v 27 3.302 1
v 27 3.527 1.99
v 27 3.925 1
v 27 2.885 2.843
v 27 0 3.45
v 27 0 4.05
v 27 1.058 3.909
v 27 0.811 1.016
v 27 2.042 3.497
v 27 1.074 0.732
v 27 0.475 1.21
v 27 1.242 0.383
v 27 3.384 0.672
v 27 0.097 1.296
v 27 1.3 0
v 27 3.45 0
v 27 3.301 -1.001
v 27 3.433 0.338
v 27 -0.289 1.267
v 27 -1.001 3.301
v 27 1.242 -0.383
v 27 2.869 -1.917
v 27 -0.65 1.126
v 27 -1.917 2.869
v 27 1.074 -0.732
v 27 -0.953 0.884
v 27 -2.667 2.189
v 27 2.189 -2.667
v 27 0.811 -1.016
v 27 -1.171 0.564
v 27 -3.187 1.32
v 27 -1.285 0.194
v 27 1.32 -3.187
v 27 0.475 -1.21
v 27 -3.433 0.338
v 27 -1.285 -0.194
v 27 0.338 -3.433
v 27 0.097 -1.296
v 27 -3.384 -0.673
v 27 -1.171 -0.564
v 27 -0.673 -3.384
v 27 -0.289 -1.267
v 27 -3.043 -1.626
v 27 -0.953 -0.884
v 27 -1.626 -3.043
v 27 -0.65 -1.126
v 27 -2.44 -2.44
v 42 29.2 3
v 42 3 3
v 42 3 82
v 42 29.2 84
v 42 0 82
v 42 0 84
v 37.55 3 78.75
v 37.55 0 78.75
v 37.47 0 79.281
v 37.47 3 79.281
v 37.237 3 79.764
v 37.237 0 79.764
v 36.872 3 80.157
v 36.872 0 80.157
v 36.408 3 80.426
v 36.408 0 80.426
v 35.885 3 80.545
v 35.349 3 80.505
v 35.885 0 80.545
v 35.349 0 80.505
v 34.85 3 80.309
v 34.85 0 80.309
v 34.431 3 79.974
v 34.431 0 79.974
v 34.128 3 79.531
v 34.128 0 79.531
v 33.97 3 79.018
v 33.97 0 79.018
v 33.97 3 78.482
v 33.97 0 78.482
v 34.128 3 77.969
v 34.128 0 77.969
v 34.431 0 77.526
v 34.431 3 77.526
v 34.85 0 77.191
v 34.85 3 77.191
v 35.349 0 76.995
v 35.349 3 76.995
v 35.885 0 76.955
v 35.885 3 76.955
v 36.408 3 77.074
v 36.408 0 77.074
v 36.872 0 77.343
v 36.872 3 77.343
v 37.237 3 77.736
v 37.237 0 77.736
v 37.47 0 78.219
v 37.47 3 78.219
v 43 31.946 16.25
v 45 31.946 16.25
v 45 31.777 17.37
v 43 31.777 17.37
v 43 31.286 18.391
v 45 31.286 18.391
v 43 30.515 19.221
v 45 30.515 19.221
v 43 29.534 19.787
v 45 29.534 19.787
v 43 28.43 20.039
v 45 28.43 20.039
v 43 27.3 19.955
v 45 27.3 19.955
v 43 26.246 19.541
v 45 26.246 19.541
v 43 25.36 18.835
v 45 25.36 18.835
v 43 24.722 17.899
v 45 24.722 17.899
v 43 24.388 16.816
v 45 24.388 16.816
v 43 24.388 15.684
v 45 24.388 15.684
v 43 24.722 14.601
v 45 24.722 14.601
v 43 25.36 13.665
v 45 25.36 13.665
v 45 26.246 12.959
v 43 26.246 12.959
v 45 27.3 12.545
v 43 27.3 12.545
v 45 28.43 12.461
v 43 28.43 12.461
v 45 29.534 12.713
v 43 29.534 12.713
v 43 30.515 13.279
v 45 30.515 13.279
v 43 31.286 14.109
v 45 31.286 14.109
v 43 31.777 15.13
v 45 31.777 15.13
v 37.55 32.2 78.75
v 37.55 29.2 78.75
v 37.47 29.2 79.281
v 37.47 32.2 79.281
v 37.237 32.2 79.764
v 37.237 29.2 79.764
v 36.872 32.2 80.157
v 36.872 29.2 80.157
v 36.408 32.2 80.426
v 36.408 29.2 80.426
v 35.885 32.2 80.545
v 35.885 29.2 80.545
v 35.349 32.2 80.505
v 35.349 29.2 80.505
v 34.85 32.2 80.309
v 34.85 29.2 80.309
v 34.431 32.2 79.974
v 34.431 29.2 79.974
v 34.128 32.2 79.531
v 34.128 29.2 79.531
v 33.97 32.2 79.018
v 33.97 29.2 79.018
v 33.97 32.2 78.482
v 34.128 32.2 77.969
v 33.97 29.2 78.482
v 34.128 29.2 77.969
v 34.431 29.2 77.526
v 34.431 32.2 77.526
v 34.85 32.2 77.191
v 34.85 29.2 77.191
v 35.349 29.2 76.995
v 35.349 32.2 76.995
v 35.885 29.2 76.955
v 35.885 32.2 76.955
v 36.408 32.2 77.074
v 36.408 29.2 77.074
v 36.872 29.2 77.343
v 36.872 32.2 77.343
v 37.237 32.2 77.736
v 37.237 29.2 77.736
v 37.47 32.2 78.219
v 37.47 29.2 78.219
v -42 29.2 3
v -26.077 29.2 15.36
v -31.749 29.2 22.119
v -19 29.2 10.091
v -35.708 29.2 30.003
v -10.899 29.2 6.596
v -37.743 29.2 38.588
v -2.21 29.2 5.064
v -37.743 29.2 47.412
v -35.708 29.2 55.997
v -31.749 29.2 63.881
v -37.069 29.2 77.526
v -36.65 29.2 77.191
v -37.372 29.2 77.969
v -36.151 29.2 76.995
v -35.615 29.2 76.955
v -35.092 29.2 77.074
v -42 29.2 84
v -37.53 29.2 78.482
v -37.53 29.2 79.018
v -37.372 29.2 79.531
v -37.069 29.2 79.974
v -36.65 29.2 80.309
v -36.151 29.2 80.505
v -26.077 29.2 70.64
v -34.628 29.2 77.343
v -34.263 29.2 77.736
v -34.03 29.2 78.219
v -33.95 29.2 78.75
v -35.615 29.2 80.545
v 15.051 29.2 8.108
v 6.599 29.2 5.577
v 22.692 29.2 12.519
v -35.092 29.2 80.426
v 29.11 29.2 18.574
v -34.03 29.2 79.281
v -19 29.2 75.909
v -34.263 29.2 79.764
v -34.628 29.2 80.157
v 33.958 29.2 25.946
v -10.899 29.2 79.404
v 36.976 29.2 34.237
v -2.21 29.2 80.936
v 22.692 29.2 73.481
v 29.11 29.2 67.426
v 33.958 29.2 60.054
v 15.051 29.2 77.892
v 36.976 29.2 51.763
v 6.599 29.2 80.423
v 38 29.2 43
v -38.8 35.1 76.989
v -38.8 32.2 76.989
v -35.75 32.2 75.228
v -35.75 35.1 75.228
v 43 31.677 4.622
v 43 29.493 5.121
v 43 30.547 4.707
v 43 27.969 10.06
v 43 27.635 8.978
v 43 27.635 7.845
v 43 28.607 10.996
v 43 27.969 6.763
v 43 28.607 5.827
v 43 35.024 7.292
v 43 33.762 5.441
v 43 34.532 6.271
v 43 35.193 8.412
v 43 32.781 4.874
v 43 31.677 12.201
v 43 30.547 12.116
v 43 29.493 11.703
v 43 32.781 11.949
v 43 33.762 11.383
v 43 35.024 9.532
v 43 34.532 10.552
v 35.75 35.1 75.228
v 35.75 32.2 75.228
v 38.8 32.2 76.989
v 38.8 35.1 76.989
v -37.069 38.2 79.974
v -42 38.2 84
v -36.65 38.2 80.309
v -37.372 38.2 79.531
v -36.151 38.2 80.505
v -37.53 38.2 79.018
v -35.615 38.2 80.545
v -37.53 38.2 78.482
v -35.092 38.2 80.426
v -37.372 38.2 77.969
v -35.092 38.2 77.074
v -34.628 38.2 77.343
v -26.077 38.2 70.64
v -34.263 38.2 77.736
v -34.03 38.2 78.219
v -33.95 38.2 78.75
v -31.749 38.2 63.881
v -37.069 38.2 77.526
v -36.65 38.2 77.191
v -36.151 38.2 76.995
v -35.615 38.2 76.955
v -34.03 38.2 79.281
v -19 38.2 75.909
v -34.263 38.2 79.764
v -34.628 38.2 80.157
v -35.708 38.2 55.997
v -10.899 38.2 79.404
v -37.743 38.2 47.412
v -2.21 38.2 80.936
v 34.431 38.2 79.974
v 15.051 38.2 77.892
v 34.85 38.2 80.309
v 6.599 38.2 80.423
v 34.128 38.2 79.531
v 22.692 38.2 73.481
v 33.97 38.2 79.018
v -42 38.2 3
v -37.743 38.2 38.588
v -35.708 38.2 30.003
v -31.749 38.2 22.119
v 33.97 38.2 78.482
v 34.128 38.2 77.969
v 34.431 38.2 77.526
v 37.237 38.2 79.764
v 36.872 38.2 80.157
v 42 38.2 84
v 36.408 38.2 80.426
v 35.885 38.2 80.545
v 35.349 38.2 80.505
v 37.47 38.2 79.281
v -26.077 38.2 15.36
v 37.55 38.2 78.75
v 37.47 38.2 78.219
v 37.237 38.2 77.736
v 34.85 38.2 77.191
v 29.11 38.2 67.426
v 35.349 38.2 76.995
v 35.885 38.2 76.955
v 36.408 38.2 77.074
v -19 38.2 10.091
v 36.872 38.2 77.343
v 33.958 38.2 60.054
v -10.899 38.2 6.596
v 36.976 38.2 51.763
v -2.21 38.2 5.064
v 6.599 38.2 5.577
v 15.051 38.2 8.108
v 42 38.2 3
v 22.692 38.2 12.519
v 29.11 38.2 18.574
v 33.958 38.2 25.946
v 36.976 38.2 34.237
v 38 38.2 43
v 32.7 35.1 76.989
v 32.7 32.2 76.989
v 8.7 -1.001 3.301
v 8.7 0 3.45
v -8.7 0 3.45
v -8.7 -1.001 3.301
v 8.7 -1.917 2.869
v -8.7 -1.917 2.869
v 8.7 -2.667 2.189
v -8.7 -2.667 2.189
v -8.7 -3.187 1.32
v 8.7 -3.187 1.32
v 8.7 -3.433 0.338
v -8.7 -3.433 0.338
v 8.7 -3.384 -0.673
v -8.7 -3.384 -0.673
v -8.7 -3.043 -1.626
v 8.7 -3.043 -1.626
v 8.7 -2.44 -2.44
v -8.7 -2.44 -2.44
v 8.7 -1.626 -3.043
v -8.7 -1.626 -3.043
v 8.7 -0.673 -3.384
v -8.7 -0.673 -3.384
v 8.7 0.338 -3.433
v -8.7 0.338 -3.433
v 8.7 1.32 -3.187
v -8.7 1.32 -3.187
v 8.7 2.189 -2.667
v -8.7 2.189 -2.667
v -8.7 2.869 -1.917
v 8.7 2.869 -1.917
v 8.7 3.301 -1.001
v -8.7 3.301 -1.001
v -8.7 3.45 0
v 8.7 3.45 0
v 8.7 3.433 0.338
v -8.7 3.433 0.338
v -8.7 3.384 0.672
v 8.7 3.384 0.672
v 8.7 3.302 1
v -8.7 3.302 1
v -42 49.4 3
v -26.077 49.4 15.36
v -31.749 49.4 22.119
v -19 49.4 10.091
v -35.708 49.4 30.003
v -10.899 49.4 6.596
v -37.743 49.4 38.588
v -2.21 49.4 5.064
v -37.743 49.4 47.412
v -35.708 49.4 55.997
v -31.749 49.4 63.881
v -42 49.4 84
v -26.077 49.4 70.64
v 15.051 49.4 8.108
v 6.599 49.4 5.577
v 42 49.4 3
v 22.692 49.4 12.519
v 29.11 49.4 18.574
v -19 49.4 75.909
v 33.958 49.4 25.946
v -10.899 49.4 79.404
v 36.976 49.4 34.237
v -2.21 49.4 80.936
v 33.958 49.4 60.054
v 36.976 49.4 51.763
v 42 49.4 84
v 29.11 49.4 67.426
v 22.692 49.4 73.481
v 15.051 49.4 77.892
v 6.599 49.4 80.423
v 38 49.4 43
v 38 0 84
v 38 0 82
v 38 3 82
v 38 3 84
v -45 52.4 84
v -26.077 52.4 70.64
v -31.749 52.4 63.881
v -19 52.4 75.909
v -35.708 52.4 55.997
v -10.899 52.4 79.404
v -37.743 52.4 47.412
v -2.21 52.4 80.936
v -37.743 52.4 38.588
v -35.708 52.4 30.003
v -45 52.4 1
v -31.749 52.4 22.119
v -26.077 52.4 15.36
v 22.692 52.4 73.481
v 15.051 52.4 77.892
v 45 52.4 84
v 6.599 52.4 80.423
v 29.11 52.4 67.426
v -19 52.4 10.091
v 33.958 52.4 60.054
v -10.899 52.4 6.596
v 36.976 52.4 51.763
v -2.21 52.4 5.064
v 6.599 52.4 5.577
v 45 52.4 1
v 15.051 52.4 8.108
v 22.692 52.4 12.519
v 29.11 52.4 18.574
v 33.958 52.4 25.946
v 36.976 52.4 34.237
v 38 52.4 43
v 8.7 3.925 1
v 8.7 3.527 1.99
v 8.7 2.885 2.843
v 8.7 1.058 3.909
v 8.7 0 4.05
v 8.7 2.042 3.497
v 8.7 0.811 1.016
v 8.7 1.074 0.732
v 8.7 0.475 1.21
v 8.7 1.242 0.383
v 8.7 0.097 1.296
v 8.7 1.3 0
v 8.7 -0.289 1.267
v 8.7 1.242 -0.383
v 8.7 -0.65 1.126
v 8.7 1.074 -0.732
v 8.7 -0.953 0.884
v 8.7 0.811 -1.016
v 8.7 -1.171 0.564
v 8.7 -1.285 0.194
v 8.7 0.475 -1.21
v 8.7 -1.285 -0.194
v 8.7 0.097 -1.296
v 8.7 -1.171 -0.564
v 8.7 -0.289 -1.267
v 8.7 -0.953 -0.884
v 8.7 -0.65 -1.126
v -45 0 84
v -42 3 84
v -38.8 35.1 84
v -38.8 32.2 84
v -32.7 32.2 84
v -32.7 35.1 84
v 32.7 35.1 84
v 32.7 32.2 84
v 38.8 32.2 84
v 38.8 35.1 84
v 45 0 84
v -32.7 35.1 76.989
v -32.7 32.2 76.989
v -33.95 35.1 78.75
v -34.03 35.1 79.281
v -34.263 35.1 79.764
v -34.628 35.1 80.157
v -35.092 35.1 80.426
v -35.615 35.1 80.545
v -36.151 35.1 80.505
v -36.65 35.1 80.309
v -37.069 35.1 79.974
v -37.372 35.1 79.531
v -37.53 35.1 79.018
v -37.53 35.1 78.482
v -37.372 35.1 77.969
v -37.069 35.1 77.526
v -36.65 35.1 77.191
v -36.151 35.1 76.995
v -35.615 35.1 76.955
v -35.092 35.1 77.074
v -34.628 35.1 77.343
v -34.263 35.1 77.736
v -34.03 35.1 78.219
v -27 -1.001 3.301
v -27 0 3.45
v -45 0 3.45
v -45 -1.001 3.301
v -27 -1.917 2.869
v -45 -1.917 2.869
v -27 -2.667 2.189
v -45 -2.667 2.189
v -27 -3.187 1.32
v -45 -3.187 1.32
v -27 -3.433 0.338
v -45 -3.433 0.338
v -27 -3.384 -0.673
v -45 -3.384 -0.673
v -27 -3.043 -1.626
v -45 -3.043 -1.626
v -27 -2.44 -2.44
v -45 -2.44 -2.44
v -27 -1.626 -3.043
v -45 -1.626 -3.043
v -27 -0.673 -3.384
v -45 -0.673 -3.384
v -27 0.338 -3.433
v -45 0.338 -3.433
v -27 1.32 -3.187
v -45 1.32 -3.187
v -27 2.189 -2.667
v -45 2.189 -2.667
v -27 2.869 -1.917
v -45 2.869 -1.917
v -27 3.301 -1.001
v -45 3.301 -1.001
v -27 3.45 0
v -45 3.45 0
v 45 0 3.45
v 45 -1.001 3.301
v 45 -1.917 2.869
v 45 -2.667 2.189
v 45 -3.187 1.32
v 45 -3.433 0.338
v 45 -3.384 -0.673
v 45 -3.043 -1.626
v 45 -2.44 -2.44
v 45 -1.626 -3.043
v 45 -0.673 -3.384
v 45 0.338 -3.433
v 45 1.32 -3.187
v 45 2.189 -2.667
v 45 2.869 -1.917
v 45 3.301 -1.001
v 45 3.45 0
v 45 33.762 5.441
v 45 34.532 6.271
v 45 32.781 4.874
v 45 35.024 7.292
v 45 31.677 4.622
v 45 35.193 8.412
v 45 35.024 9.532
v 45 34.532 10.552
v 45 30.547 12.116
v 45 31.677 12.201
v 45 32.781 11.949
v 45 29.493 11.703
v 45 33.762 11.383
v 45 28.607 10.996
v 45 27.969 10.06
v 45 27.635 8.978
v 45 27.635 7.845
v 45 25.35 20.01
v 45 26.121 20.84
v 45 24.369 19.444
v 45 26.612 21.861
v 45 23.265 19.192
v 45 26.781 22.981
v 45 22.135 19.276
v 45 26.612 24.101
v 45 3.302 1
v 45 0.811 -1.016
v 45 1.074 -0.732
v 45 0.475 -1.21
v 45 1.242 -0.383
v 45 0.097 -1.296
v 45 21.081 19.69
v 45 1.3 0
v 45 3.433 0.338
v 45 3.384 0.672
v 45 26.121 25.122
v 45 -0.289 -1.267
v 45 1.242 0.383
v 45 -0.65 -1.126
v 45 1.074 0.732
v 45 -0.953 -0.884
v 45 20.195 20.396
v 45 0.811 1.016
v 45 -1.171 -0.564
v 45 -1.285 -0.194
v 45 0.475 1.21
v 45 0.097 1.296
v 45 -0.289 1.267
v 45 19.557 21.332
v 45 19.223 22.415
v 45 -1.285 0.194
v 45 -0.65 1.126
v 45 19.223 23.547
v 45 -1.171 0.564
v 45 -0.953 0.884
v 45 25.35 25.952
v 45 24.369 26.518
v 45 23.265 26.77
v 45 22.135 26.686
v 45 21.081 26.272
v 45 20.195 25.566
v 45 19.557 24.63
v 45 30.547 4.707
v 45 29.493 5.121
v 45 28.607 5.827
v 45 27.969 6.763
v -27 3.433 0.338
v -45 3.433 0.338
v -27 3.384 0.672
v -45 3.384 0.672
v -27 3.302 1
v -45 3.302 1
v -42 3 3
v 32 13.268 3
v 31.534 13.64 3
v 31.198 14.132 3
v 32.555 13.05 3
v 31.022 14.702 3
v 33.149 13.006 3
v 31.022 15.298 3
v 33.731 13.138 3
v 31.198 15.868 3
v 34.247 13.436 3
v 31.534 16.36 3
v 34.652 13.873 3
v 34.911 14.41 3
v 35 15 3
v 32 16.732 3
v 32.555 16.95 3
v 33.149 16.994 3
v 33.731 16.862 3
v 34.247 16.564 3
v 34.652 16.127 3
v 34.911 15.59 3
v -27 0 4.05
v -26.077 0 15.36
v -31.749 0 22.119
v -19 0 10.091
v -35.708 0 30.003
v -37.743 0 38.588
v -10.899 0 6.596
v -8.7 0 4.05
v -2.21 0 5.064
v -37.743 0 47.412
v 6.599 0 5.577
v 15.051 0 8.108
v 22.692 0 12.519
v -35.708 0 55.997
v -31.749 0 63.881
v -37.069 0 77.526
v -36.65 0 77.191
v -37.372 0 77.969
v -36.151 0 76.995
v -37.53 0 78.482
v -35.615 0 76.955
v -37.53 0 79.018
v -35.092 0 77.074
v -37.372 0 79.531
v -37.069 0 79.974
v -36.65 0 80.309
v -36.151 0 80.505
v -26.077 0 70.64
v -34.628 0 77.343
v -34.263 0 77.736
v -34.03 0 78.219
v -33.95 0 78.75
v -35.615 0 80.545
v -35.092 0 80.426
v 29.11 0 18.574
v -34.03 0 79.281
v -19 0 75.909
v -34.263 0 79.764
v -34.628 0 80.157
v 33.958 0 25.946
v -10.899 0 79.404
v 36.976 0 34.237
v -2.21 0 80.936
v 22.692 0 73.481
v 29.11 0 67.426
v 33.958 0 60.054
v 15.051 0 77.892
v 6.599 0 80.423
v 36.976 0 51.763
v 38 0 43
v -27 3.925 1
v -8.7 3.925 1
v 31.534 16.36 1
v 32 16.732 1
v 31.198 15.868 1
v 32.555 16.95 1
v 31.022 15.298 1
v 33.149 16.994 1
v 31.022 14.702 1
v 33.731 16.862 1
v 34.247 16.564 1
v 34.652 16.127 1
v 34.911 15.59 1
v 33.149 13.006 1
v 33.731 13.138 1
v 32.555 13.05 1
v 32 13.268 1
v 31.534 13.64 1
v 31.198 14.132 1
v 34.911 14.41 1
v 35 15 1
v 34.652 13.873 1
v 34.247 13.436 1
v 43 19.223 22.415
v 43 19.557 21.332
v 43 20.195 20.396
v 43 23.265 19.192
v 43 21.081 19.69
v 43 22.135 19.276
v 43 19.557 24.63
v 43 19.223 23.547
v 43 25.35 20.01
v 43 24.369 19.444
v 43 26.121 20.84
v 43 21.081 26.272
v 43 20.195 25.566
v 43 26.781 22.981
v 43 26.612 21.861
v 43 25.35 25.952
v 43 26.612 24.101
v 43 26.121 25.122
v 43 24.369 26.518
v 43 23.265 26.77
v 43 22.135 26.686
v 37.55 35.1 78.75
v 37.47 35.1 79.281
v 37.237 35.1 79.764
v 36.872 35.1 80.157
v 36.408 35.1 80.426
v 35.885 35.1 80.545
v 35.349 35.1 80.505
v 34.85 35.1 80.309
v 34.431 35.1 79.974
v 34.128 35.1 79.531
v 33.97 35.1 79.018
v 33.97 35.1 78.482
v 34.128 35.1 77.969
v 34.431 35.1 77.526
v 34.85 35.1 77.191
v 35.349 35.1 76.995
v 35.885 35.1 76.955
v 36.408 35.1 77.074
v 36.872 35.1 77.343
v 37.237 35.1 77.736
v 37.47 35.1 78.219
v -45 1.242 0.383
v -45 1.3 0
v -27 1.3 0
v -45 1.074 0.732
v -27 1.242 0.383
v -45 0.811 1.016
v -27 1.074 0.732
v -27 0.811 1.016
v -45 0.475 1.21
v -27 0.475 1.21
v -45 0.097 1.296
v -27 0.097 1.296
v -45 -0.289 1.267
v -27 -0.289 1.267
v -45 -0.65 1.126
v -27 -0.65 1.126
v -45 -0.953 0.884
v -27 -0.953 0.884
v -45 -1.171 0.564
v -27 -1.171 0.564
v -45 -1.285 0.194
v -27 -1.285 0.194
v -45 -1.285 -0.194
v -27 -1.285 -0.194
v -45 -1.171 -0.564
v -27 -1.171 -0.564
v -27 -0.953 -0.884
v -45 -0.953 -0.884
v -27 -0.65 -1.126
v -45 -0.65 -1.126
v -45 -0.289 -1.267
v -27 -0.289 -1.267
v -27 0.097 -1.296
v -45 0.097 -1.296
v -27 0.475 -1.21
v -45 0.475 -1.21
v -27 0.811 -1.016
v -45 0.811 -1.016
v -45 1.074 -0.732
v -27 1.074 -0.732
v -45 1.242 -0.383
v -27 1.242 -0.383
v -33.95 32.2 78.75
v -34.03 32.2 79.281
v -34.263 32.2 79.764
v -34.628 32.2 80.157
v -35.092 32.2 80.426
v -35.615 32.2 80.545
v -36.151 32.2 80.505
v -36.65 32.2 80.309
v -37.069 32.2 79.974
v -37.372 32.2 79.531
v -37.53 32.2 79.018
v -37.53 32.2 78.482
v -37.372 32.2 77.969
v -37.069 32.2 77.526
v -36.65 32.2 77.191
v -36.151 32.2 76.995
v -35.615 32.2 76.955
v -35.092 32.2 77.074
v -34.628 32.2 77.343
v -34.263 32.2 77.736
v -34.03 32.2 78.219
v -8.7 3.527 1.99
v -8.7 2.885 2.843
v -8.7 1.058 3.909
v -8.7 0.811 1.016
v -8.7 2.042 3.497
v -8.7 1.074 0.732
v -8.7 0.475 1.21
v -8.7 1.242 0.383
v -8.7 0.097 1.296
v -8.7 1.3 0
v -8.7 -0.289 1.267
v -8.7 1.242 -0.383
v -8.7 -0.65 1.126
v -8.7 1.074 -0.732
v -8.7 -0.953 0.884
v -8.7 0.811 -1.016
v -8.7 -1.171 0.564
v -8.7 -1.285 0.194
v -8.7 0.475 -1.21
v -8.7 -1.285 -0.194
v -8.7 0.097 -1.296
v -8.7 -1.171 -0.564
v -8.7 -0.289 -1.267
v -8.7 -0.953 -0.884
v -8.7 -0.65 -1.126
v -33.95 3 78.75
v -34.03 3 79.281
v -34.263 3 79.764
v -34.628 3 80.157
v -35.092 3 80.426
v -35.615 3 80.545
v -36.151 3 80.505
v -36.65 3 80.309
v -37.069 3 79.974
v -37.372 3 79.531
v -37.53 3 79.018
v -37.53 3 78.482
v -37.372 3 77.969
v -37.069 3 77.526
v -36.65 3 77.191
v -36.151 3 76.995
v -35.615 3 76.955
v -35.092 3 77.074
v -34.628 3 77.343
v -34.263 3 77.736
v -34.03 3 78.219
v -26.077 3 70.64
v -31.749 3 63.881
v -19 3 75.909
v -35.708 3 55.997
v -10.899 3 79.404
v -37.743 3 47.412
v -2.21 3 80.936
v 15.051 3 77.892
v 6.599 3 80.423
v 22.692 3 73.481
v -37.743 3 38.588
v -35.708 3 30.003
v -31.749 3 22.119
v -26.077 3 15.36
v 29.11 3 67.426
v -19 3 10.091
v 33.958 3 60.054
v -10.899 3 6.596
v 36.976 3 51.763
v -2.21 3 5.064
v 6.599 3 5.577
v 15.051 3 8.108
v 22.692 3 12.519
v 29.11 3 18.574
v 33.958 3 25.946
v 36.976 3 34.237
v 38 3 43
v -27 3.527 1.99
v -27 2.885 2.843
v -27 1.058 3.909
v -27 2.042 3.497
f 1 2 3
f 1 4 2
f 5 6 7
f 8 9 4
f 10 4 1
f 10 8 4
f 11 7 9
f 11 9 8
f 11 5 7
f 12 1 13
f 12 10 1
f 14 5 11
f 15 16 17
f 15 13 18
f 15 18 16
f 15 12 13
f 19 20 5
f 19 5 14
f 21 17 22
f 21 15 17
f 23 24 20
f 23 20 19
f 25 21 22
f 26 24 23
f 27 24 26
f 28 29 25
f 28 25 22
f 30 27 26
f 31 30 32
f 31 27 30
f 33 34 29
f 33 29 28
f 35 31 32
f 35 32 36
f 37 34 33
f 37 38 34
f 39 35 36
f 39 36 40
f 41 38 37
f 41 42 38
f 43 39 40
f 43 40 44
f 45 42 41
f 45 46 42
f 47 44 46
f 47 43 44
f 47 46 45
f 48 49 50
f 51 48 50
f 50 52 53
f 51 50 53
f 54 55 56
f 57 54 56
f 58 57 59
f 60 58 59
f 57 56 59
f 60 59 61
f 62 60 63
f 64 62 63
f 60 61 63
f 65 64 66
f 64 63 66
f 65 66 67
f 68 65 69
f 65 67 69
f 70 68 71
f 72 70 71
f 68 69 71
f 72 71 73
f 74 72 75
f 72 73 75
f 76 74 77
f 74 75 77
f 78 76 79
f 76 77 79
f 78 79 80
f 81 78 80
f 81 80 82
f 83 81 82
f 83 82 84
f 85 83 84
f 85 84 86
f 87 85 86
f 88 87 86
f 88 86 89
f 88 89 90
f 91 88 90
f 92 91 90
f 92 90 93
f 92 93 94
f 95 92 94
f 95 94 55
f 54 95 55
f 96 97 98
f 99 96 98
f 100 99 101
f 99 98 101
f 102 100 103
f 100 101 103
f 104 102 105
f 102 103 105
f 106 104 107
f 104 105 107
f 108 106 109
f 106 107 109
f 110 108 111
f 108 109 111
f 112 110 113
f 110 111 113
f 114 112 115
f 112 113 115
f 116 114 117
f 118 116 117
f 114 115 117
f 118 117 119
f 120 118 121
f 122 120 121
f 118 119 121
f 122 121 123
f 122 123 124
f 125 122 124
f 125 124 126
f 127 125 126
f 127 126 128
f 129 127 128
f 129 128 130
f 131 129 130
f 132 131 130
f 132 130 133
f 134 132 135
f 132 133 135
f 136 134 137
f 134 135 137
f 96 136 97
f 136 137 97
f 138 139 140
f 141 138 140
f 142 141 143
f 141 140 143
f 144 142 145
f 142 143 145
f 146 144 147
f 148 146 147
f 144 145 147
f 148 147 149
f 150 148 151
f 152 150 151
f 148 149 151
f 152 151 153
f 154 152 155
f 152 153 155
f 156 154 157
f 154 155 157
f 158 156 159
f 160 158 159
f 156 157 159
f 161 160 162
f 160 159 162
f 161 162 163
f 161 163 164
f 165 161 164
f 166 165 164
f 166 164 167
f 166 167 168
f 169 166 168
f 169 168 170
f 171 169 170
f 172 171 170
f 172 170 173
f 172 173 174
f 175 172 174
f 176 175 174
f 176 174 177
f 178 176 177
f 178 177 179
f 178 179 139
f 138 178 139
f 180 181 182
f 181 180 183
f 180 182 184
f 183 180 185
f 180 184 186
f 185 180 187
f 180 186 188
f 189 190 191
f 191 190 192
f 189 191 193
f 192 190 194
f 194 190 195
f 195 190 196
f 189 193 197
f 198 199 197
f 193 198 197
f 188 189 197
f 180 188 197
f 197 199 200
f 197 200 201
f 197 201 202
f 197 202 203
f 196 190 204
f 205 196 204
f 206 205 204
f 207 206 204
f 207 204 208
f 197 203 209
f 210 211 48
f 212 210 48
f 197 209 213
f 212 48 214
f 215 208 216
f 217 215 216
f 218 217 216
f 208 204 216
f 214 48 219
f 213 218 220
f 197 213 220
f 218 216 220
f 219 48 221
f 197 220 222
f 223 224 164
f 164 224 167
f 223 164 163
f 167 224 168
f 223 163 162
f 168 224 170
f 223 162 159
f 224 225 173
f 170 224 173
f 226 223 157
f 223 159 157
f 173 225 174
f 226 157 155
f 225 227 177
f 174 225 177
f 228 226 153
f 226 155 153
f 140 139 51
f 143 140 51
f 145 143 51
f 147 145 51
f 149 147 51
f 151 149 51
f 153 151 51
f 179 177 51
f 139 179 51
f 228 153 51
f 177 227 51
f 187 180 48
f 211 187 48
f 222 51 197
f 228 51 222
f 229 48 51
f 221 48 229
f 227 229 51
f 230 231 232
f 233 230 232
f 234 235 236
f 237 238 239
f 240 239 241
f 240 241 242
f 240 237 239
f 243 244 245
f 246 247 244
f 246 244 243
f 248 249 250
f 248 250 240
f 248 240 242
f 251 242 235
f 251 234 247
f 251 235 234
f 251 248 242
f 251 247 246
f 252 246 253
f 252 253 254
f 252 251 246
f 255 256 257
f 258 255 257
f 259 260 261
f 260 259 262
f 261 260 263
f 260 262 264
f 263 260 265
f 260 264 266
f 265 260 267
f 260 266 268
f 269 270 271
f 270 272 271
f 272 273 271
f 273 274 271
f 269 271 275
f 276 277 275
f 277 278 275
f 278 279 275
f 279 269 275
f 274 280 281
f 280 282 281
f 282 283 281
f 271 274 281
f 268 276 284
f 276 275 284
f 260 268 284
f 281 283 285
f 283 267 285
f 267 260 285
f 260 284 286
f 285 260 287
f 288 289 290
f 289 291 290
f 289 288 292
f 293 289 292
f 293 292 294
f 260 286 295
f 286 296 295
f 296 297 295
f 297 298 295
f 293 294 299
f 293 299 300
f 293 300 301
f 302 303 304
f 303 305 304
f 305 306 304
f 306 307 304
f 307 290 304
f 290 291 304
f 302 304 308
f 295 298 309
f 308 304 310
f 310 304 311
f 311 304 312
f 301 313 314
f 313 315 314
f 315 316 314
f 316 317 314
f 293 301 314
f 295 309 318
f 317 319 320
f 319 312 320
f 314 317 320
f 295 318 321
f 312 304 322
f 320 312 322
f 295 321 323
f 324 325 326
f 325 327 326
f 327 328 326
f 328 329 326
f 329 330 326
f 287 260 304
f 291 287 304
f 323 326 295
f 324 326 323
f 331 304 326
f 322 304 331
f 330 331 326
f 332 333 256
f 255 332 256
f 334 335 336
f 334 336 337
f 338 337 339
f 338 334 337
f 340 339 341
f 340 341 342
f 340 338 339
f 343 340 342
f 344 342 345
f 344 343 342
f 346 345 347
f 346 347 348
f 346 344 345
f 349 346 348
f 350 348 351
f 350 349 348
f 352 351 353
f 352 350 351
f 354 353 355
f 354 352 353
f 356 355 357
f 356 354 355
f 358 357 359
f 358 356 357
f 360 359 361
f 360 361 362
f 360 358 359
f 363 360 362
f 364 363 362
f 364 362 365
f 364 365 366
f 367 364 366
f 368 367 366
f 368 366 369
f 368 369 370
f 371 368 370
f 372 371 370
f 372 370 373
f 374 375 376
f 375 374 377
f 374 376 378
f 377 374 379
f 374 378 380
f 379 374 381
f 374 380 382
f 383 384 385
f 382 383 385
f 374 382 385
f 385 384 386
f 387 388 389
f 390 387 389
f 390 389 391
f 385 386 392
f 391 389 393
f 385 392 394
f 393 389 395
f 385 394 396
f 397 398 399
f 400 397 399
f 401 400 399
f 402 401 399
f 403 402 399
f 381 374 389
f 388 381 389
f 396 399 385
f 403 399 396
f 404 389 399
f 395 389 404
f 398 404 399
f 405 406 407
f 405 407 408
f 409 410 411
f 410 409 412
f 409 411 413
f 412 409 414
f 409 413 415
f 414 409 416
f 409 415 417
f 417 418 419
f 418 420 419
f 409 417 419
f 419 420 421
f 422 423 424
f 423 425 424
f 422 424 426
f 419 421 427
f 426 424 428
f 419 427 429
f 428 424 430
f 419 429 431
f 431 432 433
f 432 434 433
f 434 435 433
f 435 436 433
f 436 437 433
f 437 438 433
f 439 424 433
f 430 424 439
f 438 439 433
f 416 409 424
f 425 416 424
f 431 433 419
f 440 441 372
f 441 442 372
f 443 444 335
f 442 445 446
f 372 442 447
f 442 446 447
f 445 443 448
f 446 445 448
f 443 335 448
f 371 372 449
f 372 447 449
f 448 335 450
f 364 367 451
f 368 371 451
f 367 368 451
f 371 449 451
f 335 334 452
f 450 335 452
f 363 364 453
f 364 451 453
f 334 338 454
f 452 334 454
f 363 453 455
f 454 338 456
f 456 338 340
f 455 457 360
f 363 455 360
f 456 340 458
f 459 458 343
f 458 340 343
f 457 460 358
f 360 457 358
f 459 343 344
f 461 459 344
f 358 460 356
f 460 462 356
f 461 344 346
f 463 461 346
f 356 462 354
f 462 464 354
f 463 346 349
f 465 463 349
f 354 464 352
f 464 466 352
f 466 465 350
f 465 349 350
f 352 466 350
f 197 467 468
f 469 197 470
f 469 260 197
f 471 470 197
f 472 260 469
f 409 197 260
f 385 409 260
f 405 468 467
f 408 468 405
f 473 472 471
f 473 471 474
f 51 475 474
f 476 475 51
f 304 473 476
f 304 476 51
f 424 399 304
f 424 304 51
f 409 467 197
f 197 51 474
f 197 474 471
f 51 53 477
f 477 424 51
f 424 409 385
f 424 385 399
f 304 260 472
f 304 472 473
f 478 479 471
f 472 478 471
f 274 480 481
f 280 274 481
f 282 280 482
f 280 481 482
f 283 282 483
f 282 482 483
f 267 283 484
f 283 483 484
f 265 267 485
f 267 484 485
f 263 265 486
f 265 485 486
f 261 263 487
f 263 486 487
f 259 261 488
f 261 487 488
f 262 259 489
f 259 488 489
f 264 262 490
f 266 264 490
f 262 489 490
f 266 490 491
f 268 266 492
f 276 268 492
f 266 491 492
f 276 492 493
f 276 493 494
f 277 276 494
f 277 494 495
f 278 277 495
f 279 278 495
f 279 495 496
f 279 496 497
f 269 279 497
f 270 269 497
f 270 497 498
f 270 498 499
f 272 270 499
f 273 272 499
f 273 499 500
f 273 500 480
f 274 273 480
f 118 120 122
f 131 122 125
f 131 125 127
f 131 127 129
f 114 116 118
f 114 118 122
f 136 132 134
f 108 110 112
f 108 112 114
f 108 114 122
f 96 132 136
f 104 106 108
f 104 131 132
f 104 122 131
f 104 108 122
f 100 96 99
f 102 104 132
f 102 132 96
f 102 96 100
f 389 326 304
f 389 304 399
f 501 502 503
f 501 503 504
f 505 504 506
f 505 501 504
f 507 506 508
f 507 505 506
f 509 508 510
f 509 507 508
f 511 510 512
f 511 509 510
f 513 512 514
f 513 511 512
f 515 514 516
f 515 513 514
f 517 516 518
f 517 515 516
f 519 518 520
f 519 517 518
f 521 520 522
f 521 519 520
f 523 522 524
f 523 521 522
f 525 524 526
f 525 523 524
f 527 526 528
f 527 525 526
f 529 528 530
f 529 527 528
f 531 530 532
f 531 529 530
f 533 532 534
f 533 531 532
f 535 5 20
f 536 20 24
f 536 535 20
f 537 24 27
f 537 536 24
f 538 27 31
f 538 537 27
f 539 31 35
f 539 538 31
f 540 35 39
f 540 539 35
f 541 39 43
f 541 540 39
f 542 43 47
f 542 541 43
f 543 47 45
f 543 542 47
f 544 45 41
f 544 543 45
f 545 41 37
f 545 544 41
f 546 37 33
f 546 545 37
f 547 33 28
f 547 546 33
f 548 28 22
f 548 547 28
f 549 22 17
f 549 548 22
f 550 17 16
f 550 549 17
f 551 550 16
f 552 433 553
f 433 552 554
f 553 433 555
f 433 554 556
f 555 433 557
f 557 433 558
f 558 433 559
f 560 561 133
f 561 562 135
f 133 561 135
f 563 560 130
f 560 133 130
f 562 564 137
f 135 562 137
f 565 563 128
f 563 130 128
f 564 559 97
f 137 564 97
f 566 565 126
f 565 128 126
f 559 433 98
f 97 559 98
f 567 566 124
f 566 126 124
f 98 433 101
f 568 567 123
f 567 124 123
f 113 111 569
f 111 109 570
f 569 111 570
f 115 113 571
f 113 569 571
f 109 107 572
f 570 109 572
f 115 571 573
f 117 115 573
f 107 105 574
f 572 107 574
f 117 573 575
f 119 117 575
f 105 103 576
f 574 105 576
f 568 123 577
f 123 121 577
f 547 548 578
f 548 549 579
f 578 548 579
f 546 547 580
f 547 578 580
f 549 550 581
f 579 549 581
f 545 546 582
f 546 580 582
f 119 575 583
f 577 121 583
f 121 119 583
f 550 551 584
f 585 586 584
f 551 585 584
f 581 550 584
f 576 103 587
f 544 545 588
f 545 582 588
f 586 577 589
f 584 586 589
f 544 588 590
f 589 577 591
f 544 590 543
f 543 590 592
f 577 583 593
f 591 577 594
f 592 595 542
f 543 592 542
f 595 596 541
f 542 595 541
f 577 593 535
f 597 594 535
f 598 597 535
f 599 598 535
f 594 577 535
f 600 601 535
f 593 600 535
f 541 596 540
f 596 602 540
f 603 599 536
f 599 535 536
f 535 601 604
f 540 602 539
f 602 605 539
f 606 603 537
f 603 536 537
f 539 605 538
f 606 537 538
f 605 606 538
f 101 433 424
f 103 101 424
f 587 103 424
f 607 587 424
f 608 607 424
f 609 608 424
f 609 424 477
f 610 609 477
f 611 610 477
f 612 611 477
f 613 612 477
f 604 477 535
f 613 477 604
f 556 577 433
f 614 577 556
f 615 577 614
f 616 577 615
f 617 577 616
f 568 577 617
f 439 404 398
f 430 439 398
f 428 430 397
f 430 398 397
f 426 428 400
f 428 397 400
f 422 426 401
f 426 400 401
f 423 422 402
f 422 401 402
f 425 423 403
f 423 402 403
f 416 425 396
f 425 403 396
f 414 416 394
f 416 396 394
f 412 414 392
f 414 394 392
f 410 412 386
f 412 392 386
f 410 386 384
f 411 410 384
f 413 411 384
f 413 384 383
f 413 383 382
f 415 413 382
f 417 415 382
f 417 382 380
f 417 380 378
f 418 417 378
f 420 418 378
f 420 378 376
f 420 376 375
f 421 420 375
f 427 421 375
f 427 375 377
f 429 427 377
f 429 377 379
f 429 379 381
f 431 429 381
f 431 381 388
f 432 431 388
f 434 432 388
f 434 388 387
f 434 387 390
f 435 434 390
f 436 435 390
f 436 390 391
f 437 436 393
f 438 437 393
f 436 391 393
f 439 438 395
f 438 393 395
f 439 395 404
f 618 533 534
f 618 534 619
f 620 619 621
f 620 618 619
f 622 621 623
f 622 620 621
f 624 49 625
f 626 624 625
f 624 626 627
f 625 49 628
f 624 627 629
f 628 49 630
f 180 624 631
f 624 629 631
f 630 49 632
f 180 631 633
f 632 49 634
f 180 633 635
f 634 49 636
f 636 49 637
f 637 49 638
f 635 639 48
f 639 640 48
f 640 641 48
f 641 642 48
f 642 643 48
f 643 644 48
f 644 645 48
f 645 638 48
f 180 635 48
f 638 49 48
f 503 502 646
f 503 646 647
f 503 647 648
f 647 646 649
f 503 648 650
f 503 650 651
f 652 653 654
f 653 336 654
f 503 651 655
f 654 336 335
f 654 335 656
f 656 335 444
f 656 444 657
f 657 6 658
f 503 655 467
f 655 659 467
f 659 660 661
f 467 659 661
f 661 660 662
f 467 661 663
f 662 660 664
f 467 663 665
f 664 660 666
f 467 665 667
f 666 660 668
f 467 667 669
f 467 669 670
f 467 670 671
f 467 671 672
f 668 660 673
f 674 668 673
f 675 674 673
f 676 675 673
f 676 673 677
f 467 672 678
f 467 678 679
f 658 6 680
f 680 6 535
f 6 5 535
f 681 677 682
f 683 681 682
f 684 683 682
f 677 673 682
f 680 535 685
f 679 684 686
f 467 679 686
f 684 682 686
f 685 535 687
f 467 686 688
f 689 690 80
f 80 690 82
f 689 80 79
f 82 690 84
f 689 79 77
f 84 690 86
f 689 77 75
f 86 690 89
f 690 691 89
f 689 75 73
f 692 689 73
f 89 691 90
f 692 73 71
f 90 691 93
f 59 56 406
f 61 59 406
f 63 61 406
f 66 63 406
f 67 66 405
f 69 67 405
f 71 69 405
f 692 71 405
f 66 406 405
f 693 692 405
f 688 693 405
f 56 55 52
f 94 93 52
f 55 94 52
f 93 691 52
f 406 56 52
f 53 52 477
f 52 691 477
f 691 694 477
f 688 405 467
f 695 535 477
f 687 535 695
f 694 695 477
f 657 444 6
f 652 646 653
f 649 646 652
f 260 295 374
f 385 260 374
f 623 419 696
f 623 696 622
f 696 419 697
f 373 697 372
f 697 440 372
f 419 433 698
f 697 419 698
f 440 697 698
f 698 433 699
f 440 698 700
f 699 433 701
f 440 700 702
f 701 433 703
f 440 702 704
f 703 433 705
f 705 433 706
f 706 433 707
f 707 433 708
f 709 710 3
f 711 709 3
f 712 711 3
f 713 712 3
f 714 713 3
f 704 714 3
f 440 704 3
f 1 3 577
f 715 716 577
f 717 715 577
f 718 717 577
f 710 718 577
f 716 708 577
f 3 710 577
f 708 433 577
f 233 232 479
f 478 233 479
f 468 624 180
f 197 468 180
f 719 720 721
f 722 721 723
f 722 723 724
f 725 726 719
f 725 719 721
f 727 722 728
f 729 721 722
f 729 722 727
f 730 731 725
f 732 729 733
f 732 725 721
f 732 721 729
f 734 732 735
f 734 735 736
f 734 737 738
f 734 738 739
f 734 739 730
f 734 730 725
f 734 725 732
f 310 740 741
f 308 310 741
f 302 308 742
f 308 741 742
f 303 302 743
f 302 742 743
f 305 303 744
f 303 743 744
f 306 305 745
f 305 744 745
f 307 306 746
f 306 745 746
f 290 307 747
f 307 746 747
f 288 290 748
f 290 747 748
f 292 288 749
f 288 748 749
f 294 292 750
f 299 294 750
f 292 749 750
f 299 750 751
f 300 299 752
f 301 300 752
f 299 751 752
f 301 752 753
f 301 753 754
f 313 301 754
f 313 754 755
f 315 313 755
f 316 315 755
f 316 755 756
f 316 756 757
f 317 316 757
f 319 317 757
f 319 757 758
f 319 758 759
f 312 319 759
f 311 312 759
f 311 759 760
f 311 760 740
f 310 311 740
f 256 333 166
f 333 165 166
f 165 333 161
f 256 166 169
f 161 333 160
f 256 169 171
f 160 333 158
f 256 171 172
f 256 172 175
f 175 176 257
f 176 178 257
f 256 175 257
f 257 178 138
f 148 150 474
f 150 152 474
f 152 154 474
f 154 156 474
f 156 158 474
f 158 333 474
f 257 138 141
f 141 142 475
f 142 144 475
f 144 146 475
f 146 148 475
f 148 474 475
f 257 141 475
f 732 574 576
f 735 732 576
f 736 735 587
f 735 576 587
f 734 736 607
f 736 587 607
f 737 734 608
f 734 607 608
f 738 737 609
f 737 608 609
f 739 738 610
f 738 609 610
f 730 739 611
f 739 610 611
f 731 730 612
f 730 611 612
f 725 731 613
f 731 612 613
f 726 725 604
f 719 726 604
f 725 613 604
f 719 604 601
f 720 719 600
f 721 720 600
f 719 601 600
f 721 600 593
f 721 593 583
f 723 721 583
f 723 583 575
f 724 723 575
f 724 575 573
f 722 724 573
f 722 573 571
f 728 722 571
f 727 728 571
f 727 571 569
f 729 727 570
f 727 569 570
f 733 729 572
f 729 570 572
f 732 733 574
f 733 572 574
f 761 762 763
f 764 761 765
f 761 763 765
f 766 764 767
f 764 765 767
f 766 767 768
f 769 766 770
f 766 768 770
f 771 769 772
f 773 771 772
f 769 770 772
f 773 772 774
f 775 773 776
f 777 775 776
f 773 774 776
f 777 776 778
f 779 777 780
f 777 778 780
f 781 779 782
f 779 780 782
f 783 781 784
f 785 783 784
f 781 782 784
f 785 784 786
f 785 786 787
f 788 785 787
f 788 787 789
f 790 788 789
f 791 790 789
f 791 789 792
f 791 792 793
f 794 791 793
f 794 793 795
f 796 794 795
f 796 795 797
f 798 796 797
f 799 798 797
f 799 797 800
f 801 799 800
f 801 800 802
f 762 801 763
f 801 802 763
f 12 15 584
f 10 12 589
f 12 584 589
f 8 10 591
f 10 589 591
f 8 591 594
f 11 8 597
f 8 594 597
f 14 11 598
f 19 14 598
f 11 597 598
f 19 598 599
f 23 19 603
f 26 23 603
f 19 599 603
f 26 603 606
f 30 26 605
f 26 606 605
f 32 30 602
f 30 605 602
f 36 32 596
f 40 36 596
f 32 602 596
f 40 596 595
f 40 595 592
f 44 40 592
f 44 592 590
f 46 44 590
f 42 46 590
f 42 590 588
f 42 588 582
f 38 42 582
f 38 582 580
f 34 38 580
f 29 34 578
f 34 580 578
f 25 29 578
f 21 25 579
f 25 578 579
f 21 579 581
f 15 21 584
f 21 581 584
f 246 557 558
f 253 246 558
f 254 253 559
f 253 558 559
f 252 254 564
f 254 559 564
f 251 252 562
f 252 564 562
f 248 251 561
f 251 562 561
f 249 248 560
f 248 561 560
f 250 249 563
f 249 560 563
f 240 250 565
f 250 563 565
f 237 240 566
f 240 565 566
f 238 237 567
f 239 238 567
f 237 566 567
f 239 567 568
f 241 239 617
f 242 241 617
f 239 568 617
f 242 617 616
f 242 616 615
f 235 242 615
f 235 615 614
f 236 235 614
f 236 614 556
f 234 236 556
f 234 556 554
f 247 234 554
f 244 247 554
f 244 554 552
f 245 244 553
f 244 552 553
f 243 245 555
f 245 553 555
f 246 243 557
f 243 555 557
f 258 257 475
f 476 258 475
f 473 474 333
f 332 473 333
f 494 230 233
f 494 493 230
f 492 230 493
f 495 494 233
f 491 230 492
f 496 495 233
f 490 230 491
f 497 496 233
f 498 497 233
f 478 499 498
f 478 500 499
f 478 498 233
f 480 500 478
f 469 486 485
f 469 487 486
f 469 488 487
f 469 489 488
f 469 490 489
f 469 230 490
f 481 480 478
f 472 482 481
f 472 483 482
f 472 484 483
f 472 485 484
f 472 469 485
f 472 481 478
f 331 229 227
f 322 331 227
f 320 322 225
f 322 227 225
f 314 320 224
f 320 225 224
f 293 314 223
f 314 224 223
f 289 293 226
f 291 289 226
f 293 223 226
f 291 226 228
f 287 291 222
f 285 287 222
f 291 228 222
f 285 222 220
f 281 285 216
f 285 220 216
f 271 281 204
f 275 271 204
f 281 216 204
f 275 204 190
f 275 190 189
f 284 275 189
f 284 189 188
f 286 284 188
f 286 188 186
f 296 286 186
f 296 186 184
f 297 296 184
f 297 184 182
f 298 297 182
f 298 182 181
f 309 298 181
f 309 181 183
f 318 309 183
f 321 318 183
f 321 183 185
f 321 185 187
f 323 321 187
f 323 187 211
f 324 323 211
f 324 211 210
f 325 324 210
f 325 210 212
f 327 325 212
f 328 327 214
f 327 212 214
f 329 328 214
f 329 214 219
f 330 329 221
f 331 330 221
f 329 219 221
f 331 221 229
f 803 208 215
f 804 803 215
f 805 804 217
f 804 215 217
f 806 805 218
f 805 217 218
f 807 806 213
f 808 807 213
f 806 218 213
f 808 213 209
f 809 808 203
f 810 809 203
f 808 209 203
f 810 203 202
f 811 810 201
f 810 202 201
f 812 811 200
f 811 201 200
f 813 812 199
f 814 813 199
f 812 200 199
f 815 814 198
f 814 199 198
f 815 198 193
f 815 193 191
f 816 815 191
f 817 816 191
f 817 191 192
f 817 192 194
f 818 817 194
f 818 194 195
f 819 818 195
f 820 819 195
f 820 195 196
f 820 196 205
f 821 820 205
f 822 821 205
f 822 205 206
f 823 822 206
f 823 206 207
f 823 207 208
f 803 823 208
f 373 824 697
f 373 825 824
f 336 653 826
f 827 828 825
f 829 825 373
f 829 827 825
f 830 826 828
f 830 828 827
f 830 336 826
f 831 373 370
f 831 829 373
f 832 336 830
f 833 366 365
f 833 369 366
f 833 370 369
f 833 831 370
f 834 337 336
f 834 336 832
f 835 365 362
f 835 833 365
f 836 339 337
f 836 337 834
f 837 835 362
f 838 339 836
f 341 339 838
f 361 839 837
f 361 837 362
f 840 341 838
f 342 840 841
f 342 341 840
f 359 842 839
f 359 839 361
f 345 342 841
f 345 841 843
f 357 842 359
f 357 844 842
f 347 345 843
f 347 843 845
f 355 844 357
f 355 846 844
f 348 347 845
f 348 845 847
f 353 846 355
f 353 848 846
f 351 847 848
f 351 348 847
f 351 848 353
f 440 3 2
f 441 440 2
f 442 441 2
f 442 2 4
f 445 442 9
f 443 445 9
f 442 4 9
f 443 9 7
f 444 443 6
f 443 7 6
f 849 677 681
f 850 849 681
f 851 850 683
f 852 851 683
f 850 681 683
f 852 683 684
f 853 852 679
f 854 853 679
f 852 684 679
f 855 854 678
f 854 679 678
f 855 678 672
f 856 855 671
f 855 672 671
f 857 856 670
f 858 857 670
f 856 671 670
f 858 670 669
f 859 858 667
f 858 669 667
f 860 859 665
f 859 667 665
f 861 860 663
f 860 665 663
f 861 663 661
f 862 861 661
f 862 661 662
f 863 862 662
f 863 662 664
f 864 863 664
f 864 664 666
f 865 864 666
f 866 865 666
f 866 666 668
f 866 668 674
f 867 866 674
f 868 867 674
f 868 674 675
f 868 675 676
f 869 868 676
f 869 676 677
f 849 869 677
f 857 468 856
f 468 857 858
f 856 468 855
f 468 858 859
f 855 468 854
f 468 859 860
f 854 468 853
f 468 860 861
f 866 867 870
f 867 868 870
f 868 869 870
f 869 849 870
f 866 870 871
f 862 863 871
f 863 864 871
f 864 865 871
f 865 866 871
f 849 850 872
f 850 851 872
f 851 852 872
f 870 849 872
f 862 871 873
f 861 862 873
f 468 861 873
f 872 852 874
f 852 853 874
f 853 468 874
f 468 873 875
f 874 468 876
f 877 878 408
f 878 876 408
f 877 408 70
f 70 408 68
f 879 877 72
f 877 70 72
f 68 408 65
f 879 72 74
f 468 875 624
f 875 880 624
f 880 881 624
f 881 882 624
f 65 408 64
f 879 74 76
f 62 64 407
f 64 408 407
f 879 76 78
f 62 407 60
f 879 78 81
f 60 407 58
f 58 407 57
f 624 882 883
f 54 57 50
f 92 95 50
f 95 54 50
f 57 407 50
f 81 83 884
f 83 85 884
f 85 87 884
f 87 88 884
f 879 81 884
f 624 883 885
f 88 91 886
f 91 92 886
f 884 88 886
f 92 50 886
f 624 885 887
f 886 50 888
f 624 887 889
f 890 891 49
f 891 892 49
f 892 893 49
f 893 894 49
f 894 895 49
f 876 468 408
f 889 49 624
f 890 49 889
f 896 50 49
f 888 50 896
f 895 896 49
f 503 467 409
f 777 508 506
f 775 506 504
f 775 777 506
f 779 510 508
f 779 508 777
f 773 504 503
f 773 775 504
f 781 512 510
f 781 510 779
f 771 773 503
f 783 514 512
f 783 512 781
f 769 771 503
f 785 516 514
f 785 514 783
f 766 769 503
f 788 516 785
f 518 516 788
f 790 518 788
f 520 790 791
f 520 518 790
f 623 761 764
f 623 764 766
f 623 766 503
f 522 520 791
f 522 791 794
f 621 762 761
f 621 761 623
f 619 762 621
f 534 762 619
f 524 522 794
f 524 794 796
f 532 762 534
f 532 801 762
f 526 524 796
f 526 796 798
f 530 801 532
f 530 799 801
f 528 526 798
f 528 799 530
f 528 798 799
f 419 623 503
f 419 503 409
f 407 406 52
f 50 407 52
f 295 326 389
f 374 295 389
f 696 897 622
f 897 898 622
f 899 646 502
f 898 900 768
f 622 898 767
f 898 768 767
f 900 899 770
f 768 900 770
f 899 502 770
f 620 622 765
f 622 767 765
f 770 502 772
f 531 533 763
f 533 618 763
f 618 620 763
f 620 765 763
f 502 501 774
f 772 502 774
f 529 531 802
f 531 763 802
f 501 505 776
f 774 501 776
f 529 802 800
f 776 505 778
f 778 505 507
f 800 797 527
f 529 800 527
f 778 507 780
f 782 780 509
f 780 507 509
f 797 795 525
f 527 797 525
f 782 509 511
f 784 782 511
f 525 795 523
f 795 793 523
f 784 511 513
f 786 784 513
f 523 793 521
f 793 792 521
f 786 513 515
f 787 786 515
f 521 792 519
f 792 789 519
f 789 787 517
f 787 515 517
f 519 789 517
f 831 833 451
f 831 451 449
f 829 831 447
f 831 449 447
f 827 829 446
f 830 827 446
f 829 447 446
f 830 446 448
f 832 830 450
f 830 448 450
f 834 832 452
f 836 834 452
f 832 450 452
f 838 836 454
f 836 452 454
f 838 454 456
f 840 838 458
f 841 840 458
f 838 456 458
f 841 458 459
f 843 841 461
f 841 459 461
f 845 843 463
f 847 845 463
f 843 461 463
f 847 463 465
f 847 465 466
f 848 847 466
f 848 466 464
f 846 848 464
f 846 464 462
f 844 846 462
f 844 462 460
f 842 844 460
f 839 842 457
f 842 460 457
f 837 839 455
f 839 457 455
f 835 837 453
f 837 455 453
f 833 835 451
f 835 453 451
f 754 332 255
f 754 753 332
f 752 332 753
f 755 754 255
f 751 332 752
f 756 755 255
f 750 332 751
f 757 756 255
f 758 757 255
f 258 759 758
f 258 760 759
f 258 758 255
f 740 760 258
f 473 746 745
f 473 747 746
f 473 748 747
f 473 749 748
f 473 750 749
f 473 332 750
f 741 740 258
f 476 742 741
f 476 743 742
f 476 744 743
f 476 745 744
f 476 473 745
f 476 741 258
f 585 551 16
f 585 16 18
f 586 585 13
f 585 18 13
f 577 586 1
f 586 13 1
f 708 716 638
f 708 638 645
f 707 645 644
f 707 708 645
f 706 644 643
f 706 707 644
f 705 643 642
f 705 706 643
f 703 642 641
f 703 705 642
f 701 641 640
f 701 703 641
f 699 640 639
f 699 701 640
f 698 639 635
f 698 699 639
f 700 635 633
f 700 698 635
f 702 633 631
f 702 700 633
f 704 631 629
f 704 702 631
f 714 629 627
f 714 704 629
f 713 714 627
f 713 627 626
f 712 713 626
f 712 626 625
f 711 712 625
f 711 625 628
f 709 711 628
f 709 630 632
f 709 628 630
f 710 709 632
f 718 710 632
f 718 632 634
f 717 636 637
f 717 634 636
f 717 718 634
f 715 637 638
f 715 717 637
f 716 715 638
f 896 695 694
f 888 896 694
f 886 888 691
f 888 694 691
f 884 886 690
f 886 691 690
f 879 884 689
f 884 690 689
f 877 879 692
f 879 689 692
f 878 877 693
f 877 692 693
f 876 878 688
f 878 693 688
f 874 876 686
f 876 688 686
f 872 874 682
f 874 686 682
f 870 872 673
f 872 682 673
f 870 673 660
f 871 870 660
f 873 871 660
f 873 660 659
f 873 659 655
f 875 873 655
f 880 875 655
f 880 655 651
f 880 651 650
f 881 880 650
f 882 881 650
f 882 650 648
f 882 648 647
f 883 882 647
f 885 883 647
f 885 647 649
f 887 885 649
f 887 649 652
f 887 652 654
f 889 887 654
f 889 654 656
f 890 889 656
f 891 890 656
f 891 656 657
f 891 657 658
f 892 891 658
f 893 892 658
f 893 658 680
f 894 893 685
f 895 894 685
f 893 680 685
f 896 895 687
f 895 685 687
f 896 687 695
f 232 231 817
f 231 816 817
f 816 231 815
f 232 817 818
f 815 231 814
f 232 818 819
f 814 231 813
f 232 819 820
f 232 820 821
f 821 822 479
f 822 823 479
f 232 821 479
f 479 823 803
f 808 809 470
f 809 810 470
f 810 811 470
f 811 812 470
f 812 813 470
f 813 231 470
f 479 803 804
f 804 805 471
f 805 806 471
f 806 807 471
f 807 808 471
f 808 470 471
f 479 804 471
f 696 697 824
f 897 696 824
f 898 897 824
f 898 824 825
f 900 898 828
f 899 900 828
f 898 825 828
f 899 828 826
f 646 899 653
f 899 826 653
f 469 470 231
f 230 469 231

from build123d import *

# Parameters (mm, degrees)
PAD_DEPTH            = 45
SKETCH001_R          = 38
POCKET_DEPTH         = 52.401
SKETCH005_R          = 1.8
POCKET001_DEPTH      = 38.2
SKETCH013_W          = 3
SKETCH013_H          = 26.2
PAD006_DEPTH         = 81
SKETCH014_W          = 3
SKETCH014_H          = 11.2
PAD007_DEPTH         = 81
SKETCH015_R          = 3.45
PAD008_DEPTH         = 45
SKETCH016_R          = 1.3
POCKET005_DEPTH      = 45
SKETCH017_W          = 18.3
SKETCH017_H          = 4.05
SKETCH061_R          = 3.8
POCKET021_DEPTH      = 2
SKETCH062_R          = 2
POCKET022_DEPTH      = 84.001
SKETCH064_W          = 4
SKETCH064_H          = 2
POCKET023_DEPTH      = 3
POCKET024_DEPTH      = 45.001
POCKET024_DEPTH_BACK = 45.001
POCKET029_DEPTH      = 2.9


with BuildPart() as part:
    # Sketch → Pad (new body, symmetric)
    with BuildSketch(Plane.YZ):
        Polygon((0, 84), (3, 84), (3, 3), (29.2, 3), (29.2, 84), (38.2, 84), (38.2, 3), (49.4, 3), (49.4, 84), (52.4, 84), (52.4, 0), (0, 0), align=None)
    extrude(amount=PAD_DEPTH, both=True)

    # Sketch001 → Pocket (cut, through all)
    with BuildSketch(Plane.XZ):
        with Locations((0, 43)):
            Circle(SKETCH001_R)
    extrude(amount=-POCKET_DEPTH, mode=Mode.SUBTRACT)

    # Sketch005 → Pocket001 (cut)
    with BuildSketch(Plane.XZ):
        with Locations((-35.75, 78.75)):
            Circle(SKETCH005_R)
        with Locations((35.75, 78.75)):
            Circle(SKETCH005_R)
    extrude(amount=-POCKET001_DEPTH, mode=Mode.SUBTRACT)

    # Sketch013 (on DatumPlane) → Pad006 (join)
    with BuildSketch(Plane.XY.offset(3)):
        with Locations((-43.5, 16.1)):
            Rectangle(SKETCH013_W, SKETCH013_H)
        with Locations((43.5, 16.1)):
            Rectangle(SKETCH013_W, SKETCH013_H)
    extrude(amount=PAD006_DEPTH)

    # Sketch014 (on DatumPlane) → Pad007 (join)
    with BuildSketch(Plane.XY.offset(3)):
        with Locations((-43.5, 43.8)):
            Rectangle(SKETCH014_W, SKETCH014_H)
        with Locations((43.5, 43.8)):
            Rectangle(SKETCH014_W, SKETCH014_H)
    extrude(amount=PAD007_DEPTH)

    # Sketch015 → Pad008 (join, symmetric)
    with BuildSketch(Plane.YZ):
        Circle(SKETCH015_R)
    extrude(amount=PAD008_DEPTH, both=True)

    # Sketch016 → Pocket005 (cut, symmetric)
    with BuildSketch(Plane.YZ):
        Circle(SKETCH016_R)
    extrude(amount=POCKET005_DEPTH, both=True, mode=Mode.SUBTRACT)

    # Sketch017 → Groove001 (revolve, cut)
    with BuildSketch(Plane.XZ):
        with Locations((-17.85, 2.025)):
            Rectangle(SKETCH017_W, SKETCH017_H)
        with Locations((17.85, 2.025)):
            Rectangle(SKETCH017_W, SKETCH017_H)
    revolve(axis=Axis((0, 0, 0), (1, 0, 0)), mode=Mode.SUBTRACT)

    # Sketch061 → Pocket021 (cut)
    with BuildSketch(Plane.YZ.offset(45)):
        with Locations((22.9809703886, 22.9809703886)):
            Circle(SKETCH061_R)
        with Locations((28.145825623, 16.25)):
            Circle(SKETCH061_R)
        with Locations((31.3925893544, 8.4116189658)):
            Circle(SKETCH061_R)
    extrude(amount=-POCKET021_DEPTH, mode=Mode.SUBTRACT)

    # Sketch062 → Pocket022 (cut, through all)
    with BuildSketch(Plane.XY):
        with Locations((33, 15)):
            Circle(SKETCH062_R)
    extrude(amount=POCKET022_DEPTH, mode=Mode.SUBTRACT)

    # Sketch064 → Pocket023 (cut)
    with BuildSketch(Plane.XZ):
        with Locations((40, 83)):
            Rectangle(SKETCH064_W, SKETCH064_H)
    extrude(amount=-POCKET023_DEPTH, mode=Mode.SUBTRACT)

    # Sketch065 → Pocket024 (cut, two sides)
    with BuildSketch(Plane.YZ) as pocket024_sk:
        with BuildLine():
            Line((3.45, 0), (52.4, 0))
            Line((52.4, 0), (52.4, 1))
            Line((52.4, 1), (3.3018933962, 1))
            ThreePointArc((3.45, 0), (3.4127724959, 0.5054541438), (3.3018933962, 1))
        make_face()
    extrude(amount=-POCKET024_DEPTH, mode=Mode.SUBTRACT)
    extrude(pocket024_sk.sketch, amount=POCKET024_DEPTH_BACK, mode=Mode.SUBTRACT)

    # Sketch070 (on DatumPlane) → Pocket029 (cut)
    with BuildSketch(Plane.XZ.offset(-32.2)):
        Polygon((-32.7, 76.989081679), (-32.7, 80.510918321), (-32.7, 84), (-38.8, 84), (-38.8, 80.510918321), (-38.8, 76.989081679), (-35.75, 75.2281633579), align=None)
        Polygon((38.8, 76.989081679), (38.8, 80.510918321), (38.8, 84), (32.7, 84), (32.7, 80.510918321), (32.7, 76.989081679), (35.75, 75.2281633579), align=None)
    extrude(amount=-POCKET029_DEPTH, mode=Mode.SUBTRACT)


solid = part.part
